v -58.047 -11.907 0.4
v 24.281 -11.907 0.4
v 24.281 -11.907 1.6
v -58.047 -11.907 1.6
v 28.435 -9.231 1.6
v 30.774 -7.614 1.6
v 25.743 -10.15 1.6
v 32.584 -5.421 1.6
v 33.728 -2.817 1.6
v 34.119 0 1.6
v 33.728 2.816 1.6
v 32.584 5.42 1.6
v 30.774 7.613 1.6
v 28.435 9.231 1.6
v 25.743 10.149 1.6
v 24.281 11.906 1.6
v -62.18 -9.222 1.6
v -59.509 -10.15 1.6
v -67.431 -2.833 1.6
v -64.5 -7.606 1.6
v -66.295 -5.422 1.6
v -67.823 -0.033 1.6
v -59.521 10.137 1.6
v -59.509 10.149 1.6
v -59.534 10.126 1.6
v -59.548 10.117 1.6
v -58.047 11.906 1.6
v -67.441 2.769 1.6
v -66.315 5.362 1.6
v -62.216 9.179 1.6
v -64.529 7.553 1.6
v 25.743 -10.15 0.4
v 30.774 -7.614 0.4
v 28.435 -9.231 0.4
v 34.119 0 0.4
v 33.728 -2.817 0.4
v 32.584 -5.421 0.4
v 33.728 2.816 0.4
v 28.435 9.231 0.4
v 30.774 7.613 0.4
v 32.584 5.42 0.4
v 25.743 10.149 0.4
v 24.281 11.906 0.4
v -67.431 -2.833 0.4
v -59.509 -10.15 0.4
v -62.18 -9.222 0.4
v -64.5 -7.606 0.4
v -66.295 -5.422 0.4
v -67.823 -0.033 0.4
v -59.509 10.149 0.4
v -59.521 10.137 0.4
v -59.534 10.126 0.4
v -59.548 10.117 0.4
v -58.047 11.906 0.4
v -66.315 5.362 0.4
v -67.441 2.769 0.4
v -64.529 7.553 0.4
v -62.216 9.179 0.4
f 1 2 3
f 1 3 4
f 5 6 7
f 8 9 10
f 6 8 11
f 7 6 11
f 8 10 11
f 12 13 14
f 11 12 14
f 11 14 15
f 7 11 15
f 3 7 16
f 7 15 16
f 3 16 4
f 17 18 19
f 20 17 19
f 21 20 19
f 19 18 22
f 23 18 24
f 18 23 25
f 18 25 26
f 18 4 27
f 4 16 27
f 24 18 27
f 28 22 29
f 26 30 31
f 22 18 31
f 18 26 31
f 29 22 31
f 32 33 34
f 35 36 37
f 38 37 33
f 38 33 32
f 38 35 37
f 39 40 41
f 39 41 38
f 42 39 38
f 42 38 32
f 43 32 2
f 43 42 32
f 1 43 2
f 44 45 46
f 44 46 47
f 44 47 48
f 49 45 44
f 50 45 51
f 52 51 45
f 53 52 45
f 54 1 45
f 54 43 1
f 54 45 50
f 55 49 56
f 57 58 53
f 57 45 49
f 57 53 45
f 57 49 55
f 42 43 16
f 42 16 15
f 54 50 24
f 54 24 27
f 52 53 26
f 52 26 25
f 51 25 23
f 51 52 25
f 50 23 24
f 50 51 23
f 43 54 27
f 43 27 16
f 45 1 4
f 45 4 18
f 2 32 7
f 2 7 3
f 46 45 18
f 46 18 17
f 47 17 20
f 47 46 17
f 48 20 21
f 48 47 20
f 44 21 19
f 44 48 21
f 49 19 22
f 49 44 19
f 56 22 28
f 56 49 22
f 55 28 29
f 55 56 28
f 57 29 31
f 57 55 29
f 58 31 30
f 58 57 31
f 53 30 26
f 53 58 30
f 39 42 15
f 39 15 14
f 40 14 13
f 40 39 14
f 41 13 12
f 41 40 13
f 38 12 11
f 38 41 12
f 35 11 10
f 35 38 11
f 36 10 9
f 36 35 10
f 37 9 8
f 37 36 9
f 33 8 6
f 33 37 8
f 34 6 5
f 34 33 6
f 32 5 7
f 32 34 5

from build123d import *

# Parameters (mm, degrees)
BOSS_EXTRUDE1_DEPTH = 2
SCALE1_SCALE        = 0.6


with BuildPart() as part:
    # Sketch1 → Boss-Extrude1 (new body)
    with BuildSketch(Plane.XY):
        with BuildLine():
            Line((-87.945199987, 16.915862102), (-85.508172497, 19.844172117))
            Line((-85.508172497, 19.844172117), (51.705430776, 19.844172117))
            Line((51.705430776, 19.844172117), (54.142458266, 16.915862102))
            ThreePointArc((54.142458266, 16.915862102), (68.102505257, 0), (54.142458266, -16.915862102))
            Line((54.142458266, -16.915862102), (51.705430776, -19.844172117))
            Line((51.705430776, -19.844172117), (-85.508172497, -19.844172117))
            Line((-85.508172497, -19.844172117), (-87.945199987, -16.915862102))
            ThreePointArc((-87.945199987, -16.915862102), (-101.800450477, -0.05365779), (-88.010047693, 16.861622033))
            ThreePointArc((-88.010047693, 16.861622033), (-87.975174361, 16.885813548), (-87.945199987, 16.915862102))
        make_face()
    extrude(amount=BOSS_EXTRUDE1_DEPTH)


with BuildPart() as part_1:
    # Scale1: scaled about (-16.855793262, -0.001137482, 1)
    add(part.part.scale(SCALE1_SCALE).moved(Location((-6.742317305, -0.000454993, 0.4))))


solid = part_1.part
